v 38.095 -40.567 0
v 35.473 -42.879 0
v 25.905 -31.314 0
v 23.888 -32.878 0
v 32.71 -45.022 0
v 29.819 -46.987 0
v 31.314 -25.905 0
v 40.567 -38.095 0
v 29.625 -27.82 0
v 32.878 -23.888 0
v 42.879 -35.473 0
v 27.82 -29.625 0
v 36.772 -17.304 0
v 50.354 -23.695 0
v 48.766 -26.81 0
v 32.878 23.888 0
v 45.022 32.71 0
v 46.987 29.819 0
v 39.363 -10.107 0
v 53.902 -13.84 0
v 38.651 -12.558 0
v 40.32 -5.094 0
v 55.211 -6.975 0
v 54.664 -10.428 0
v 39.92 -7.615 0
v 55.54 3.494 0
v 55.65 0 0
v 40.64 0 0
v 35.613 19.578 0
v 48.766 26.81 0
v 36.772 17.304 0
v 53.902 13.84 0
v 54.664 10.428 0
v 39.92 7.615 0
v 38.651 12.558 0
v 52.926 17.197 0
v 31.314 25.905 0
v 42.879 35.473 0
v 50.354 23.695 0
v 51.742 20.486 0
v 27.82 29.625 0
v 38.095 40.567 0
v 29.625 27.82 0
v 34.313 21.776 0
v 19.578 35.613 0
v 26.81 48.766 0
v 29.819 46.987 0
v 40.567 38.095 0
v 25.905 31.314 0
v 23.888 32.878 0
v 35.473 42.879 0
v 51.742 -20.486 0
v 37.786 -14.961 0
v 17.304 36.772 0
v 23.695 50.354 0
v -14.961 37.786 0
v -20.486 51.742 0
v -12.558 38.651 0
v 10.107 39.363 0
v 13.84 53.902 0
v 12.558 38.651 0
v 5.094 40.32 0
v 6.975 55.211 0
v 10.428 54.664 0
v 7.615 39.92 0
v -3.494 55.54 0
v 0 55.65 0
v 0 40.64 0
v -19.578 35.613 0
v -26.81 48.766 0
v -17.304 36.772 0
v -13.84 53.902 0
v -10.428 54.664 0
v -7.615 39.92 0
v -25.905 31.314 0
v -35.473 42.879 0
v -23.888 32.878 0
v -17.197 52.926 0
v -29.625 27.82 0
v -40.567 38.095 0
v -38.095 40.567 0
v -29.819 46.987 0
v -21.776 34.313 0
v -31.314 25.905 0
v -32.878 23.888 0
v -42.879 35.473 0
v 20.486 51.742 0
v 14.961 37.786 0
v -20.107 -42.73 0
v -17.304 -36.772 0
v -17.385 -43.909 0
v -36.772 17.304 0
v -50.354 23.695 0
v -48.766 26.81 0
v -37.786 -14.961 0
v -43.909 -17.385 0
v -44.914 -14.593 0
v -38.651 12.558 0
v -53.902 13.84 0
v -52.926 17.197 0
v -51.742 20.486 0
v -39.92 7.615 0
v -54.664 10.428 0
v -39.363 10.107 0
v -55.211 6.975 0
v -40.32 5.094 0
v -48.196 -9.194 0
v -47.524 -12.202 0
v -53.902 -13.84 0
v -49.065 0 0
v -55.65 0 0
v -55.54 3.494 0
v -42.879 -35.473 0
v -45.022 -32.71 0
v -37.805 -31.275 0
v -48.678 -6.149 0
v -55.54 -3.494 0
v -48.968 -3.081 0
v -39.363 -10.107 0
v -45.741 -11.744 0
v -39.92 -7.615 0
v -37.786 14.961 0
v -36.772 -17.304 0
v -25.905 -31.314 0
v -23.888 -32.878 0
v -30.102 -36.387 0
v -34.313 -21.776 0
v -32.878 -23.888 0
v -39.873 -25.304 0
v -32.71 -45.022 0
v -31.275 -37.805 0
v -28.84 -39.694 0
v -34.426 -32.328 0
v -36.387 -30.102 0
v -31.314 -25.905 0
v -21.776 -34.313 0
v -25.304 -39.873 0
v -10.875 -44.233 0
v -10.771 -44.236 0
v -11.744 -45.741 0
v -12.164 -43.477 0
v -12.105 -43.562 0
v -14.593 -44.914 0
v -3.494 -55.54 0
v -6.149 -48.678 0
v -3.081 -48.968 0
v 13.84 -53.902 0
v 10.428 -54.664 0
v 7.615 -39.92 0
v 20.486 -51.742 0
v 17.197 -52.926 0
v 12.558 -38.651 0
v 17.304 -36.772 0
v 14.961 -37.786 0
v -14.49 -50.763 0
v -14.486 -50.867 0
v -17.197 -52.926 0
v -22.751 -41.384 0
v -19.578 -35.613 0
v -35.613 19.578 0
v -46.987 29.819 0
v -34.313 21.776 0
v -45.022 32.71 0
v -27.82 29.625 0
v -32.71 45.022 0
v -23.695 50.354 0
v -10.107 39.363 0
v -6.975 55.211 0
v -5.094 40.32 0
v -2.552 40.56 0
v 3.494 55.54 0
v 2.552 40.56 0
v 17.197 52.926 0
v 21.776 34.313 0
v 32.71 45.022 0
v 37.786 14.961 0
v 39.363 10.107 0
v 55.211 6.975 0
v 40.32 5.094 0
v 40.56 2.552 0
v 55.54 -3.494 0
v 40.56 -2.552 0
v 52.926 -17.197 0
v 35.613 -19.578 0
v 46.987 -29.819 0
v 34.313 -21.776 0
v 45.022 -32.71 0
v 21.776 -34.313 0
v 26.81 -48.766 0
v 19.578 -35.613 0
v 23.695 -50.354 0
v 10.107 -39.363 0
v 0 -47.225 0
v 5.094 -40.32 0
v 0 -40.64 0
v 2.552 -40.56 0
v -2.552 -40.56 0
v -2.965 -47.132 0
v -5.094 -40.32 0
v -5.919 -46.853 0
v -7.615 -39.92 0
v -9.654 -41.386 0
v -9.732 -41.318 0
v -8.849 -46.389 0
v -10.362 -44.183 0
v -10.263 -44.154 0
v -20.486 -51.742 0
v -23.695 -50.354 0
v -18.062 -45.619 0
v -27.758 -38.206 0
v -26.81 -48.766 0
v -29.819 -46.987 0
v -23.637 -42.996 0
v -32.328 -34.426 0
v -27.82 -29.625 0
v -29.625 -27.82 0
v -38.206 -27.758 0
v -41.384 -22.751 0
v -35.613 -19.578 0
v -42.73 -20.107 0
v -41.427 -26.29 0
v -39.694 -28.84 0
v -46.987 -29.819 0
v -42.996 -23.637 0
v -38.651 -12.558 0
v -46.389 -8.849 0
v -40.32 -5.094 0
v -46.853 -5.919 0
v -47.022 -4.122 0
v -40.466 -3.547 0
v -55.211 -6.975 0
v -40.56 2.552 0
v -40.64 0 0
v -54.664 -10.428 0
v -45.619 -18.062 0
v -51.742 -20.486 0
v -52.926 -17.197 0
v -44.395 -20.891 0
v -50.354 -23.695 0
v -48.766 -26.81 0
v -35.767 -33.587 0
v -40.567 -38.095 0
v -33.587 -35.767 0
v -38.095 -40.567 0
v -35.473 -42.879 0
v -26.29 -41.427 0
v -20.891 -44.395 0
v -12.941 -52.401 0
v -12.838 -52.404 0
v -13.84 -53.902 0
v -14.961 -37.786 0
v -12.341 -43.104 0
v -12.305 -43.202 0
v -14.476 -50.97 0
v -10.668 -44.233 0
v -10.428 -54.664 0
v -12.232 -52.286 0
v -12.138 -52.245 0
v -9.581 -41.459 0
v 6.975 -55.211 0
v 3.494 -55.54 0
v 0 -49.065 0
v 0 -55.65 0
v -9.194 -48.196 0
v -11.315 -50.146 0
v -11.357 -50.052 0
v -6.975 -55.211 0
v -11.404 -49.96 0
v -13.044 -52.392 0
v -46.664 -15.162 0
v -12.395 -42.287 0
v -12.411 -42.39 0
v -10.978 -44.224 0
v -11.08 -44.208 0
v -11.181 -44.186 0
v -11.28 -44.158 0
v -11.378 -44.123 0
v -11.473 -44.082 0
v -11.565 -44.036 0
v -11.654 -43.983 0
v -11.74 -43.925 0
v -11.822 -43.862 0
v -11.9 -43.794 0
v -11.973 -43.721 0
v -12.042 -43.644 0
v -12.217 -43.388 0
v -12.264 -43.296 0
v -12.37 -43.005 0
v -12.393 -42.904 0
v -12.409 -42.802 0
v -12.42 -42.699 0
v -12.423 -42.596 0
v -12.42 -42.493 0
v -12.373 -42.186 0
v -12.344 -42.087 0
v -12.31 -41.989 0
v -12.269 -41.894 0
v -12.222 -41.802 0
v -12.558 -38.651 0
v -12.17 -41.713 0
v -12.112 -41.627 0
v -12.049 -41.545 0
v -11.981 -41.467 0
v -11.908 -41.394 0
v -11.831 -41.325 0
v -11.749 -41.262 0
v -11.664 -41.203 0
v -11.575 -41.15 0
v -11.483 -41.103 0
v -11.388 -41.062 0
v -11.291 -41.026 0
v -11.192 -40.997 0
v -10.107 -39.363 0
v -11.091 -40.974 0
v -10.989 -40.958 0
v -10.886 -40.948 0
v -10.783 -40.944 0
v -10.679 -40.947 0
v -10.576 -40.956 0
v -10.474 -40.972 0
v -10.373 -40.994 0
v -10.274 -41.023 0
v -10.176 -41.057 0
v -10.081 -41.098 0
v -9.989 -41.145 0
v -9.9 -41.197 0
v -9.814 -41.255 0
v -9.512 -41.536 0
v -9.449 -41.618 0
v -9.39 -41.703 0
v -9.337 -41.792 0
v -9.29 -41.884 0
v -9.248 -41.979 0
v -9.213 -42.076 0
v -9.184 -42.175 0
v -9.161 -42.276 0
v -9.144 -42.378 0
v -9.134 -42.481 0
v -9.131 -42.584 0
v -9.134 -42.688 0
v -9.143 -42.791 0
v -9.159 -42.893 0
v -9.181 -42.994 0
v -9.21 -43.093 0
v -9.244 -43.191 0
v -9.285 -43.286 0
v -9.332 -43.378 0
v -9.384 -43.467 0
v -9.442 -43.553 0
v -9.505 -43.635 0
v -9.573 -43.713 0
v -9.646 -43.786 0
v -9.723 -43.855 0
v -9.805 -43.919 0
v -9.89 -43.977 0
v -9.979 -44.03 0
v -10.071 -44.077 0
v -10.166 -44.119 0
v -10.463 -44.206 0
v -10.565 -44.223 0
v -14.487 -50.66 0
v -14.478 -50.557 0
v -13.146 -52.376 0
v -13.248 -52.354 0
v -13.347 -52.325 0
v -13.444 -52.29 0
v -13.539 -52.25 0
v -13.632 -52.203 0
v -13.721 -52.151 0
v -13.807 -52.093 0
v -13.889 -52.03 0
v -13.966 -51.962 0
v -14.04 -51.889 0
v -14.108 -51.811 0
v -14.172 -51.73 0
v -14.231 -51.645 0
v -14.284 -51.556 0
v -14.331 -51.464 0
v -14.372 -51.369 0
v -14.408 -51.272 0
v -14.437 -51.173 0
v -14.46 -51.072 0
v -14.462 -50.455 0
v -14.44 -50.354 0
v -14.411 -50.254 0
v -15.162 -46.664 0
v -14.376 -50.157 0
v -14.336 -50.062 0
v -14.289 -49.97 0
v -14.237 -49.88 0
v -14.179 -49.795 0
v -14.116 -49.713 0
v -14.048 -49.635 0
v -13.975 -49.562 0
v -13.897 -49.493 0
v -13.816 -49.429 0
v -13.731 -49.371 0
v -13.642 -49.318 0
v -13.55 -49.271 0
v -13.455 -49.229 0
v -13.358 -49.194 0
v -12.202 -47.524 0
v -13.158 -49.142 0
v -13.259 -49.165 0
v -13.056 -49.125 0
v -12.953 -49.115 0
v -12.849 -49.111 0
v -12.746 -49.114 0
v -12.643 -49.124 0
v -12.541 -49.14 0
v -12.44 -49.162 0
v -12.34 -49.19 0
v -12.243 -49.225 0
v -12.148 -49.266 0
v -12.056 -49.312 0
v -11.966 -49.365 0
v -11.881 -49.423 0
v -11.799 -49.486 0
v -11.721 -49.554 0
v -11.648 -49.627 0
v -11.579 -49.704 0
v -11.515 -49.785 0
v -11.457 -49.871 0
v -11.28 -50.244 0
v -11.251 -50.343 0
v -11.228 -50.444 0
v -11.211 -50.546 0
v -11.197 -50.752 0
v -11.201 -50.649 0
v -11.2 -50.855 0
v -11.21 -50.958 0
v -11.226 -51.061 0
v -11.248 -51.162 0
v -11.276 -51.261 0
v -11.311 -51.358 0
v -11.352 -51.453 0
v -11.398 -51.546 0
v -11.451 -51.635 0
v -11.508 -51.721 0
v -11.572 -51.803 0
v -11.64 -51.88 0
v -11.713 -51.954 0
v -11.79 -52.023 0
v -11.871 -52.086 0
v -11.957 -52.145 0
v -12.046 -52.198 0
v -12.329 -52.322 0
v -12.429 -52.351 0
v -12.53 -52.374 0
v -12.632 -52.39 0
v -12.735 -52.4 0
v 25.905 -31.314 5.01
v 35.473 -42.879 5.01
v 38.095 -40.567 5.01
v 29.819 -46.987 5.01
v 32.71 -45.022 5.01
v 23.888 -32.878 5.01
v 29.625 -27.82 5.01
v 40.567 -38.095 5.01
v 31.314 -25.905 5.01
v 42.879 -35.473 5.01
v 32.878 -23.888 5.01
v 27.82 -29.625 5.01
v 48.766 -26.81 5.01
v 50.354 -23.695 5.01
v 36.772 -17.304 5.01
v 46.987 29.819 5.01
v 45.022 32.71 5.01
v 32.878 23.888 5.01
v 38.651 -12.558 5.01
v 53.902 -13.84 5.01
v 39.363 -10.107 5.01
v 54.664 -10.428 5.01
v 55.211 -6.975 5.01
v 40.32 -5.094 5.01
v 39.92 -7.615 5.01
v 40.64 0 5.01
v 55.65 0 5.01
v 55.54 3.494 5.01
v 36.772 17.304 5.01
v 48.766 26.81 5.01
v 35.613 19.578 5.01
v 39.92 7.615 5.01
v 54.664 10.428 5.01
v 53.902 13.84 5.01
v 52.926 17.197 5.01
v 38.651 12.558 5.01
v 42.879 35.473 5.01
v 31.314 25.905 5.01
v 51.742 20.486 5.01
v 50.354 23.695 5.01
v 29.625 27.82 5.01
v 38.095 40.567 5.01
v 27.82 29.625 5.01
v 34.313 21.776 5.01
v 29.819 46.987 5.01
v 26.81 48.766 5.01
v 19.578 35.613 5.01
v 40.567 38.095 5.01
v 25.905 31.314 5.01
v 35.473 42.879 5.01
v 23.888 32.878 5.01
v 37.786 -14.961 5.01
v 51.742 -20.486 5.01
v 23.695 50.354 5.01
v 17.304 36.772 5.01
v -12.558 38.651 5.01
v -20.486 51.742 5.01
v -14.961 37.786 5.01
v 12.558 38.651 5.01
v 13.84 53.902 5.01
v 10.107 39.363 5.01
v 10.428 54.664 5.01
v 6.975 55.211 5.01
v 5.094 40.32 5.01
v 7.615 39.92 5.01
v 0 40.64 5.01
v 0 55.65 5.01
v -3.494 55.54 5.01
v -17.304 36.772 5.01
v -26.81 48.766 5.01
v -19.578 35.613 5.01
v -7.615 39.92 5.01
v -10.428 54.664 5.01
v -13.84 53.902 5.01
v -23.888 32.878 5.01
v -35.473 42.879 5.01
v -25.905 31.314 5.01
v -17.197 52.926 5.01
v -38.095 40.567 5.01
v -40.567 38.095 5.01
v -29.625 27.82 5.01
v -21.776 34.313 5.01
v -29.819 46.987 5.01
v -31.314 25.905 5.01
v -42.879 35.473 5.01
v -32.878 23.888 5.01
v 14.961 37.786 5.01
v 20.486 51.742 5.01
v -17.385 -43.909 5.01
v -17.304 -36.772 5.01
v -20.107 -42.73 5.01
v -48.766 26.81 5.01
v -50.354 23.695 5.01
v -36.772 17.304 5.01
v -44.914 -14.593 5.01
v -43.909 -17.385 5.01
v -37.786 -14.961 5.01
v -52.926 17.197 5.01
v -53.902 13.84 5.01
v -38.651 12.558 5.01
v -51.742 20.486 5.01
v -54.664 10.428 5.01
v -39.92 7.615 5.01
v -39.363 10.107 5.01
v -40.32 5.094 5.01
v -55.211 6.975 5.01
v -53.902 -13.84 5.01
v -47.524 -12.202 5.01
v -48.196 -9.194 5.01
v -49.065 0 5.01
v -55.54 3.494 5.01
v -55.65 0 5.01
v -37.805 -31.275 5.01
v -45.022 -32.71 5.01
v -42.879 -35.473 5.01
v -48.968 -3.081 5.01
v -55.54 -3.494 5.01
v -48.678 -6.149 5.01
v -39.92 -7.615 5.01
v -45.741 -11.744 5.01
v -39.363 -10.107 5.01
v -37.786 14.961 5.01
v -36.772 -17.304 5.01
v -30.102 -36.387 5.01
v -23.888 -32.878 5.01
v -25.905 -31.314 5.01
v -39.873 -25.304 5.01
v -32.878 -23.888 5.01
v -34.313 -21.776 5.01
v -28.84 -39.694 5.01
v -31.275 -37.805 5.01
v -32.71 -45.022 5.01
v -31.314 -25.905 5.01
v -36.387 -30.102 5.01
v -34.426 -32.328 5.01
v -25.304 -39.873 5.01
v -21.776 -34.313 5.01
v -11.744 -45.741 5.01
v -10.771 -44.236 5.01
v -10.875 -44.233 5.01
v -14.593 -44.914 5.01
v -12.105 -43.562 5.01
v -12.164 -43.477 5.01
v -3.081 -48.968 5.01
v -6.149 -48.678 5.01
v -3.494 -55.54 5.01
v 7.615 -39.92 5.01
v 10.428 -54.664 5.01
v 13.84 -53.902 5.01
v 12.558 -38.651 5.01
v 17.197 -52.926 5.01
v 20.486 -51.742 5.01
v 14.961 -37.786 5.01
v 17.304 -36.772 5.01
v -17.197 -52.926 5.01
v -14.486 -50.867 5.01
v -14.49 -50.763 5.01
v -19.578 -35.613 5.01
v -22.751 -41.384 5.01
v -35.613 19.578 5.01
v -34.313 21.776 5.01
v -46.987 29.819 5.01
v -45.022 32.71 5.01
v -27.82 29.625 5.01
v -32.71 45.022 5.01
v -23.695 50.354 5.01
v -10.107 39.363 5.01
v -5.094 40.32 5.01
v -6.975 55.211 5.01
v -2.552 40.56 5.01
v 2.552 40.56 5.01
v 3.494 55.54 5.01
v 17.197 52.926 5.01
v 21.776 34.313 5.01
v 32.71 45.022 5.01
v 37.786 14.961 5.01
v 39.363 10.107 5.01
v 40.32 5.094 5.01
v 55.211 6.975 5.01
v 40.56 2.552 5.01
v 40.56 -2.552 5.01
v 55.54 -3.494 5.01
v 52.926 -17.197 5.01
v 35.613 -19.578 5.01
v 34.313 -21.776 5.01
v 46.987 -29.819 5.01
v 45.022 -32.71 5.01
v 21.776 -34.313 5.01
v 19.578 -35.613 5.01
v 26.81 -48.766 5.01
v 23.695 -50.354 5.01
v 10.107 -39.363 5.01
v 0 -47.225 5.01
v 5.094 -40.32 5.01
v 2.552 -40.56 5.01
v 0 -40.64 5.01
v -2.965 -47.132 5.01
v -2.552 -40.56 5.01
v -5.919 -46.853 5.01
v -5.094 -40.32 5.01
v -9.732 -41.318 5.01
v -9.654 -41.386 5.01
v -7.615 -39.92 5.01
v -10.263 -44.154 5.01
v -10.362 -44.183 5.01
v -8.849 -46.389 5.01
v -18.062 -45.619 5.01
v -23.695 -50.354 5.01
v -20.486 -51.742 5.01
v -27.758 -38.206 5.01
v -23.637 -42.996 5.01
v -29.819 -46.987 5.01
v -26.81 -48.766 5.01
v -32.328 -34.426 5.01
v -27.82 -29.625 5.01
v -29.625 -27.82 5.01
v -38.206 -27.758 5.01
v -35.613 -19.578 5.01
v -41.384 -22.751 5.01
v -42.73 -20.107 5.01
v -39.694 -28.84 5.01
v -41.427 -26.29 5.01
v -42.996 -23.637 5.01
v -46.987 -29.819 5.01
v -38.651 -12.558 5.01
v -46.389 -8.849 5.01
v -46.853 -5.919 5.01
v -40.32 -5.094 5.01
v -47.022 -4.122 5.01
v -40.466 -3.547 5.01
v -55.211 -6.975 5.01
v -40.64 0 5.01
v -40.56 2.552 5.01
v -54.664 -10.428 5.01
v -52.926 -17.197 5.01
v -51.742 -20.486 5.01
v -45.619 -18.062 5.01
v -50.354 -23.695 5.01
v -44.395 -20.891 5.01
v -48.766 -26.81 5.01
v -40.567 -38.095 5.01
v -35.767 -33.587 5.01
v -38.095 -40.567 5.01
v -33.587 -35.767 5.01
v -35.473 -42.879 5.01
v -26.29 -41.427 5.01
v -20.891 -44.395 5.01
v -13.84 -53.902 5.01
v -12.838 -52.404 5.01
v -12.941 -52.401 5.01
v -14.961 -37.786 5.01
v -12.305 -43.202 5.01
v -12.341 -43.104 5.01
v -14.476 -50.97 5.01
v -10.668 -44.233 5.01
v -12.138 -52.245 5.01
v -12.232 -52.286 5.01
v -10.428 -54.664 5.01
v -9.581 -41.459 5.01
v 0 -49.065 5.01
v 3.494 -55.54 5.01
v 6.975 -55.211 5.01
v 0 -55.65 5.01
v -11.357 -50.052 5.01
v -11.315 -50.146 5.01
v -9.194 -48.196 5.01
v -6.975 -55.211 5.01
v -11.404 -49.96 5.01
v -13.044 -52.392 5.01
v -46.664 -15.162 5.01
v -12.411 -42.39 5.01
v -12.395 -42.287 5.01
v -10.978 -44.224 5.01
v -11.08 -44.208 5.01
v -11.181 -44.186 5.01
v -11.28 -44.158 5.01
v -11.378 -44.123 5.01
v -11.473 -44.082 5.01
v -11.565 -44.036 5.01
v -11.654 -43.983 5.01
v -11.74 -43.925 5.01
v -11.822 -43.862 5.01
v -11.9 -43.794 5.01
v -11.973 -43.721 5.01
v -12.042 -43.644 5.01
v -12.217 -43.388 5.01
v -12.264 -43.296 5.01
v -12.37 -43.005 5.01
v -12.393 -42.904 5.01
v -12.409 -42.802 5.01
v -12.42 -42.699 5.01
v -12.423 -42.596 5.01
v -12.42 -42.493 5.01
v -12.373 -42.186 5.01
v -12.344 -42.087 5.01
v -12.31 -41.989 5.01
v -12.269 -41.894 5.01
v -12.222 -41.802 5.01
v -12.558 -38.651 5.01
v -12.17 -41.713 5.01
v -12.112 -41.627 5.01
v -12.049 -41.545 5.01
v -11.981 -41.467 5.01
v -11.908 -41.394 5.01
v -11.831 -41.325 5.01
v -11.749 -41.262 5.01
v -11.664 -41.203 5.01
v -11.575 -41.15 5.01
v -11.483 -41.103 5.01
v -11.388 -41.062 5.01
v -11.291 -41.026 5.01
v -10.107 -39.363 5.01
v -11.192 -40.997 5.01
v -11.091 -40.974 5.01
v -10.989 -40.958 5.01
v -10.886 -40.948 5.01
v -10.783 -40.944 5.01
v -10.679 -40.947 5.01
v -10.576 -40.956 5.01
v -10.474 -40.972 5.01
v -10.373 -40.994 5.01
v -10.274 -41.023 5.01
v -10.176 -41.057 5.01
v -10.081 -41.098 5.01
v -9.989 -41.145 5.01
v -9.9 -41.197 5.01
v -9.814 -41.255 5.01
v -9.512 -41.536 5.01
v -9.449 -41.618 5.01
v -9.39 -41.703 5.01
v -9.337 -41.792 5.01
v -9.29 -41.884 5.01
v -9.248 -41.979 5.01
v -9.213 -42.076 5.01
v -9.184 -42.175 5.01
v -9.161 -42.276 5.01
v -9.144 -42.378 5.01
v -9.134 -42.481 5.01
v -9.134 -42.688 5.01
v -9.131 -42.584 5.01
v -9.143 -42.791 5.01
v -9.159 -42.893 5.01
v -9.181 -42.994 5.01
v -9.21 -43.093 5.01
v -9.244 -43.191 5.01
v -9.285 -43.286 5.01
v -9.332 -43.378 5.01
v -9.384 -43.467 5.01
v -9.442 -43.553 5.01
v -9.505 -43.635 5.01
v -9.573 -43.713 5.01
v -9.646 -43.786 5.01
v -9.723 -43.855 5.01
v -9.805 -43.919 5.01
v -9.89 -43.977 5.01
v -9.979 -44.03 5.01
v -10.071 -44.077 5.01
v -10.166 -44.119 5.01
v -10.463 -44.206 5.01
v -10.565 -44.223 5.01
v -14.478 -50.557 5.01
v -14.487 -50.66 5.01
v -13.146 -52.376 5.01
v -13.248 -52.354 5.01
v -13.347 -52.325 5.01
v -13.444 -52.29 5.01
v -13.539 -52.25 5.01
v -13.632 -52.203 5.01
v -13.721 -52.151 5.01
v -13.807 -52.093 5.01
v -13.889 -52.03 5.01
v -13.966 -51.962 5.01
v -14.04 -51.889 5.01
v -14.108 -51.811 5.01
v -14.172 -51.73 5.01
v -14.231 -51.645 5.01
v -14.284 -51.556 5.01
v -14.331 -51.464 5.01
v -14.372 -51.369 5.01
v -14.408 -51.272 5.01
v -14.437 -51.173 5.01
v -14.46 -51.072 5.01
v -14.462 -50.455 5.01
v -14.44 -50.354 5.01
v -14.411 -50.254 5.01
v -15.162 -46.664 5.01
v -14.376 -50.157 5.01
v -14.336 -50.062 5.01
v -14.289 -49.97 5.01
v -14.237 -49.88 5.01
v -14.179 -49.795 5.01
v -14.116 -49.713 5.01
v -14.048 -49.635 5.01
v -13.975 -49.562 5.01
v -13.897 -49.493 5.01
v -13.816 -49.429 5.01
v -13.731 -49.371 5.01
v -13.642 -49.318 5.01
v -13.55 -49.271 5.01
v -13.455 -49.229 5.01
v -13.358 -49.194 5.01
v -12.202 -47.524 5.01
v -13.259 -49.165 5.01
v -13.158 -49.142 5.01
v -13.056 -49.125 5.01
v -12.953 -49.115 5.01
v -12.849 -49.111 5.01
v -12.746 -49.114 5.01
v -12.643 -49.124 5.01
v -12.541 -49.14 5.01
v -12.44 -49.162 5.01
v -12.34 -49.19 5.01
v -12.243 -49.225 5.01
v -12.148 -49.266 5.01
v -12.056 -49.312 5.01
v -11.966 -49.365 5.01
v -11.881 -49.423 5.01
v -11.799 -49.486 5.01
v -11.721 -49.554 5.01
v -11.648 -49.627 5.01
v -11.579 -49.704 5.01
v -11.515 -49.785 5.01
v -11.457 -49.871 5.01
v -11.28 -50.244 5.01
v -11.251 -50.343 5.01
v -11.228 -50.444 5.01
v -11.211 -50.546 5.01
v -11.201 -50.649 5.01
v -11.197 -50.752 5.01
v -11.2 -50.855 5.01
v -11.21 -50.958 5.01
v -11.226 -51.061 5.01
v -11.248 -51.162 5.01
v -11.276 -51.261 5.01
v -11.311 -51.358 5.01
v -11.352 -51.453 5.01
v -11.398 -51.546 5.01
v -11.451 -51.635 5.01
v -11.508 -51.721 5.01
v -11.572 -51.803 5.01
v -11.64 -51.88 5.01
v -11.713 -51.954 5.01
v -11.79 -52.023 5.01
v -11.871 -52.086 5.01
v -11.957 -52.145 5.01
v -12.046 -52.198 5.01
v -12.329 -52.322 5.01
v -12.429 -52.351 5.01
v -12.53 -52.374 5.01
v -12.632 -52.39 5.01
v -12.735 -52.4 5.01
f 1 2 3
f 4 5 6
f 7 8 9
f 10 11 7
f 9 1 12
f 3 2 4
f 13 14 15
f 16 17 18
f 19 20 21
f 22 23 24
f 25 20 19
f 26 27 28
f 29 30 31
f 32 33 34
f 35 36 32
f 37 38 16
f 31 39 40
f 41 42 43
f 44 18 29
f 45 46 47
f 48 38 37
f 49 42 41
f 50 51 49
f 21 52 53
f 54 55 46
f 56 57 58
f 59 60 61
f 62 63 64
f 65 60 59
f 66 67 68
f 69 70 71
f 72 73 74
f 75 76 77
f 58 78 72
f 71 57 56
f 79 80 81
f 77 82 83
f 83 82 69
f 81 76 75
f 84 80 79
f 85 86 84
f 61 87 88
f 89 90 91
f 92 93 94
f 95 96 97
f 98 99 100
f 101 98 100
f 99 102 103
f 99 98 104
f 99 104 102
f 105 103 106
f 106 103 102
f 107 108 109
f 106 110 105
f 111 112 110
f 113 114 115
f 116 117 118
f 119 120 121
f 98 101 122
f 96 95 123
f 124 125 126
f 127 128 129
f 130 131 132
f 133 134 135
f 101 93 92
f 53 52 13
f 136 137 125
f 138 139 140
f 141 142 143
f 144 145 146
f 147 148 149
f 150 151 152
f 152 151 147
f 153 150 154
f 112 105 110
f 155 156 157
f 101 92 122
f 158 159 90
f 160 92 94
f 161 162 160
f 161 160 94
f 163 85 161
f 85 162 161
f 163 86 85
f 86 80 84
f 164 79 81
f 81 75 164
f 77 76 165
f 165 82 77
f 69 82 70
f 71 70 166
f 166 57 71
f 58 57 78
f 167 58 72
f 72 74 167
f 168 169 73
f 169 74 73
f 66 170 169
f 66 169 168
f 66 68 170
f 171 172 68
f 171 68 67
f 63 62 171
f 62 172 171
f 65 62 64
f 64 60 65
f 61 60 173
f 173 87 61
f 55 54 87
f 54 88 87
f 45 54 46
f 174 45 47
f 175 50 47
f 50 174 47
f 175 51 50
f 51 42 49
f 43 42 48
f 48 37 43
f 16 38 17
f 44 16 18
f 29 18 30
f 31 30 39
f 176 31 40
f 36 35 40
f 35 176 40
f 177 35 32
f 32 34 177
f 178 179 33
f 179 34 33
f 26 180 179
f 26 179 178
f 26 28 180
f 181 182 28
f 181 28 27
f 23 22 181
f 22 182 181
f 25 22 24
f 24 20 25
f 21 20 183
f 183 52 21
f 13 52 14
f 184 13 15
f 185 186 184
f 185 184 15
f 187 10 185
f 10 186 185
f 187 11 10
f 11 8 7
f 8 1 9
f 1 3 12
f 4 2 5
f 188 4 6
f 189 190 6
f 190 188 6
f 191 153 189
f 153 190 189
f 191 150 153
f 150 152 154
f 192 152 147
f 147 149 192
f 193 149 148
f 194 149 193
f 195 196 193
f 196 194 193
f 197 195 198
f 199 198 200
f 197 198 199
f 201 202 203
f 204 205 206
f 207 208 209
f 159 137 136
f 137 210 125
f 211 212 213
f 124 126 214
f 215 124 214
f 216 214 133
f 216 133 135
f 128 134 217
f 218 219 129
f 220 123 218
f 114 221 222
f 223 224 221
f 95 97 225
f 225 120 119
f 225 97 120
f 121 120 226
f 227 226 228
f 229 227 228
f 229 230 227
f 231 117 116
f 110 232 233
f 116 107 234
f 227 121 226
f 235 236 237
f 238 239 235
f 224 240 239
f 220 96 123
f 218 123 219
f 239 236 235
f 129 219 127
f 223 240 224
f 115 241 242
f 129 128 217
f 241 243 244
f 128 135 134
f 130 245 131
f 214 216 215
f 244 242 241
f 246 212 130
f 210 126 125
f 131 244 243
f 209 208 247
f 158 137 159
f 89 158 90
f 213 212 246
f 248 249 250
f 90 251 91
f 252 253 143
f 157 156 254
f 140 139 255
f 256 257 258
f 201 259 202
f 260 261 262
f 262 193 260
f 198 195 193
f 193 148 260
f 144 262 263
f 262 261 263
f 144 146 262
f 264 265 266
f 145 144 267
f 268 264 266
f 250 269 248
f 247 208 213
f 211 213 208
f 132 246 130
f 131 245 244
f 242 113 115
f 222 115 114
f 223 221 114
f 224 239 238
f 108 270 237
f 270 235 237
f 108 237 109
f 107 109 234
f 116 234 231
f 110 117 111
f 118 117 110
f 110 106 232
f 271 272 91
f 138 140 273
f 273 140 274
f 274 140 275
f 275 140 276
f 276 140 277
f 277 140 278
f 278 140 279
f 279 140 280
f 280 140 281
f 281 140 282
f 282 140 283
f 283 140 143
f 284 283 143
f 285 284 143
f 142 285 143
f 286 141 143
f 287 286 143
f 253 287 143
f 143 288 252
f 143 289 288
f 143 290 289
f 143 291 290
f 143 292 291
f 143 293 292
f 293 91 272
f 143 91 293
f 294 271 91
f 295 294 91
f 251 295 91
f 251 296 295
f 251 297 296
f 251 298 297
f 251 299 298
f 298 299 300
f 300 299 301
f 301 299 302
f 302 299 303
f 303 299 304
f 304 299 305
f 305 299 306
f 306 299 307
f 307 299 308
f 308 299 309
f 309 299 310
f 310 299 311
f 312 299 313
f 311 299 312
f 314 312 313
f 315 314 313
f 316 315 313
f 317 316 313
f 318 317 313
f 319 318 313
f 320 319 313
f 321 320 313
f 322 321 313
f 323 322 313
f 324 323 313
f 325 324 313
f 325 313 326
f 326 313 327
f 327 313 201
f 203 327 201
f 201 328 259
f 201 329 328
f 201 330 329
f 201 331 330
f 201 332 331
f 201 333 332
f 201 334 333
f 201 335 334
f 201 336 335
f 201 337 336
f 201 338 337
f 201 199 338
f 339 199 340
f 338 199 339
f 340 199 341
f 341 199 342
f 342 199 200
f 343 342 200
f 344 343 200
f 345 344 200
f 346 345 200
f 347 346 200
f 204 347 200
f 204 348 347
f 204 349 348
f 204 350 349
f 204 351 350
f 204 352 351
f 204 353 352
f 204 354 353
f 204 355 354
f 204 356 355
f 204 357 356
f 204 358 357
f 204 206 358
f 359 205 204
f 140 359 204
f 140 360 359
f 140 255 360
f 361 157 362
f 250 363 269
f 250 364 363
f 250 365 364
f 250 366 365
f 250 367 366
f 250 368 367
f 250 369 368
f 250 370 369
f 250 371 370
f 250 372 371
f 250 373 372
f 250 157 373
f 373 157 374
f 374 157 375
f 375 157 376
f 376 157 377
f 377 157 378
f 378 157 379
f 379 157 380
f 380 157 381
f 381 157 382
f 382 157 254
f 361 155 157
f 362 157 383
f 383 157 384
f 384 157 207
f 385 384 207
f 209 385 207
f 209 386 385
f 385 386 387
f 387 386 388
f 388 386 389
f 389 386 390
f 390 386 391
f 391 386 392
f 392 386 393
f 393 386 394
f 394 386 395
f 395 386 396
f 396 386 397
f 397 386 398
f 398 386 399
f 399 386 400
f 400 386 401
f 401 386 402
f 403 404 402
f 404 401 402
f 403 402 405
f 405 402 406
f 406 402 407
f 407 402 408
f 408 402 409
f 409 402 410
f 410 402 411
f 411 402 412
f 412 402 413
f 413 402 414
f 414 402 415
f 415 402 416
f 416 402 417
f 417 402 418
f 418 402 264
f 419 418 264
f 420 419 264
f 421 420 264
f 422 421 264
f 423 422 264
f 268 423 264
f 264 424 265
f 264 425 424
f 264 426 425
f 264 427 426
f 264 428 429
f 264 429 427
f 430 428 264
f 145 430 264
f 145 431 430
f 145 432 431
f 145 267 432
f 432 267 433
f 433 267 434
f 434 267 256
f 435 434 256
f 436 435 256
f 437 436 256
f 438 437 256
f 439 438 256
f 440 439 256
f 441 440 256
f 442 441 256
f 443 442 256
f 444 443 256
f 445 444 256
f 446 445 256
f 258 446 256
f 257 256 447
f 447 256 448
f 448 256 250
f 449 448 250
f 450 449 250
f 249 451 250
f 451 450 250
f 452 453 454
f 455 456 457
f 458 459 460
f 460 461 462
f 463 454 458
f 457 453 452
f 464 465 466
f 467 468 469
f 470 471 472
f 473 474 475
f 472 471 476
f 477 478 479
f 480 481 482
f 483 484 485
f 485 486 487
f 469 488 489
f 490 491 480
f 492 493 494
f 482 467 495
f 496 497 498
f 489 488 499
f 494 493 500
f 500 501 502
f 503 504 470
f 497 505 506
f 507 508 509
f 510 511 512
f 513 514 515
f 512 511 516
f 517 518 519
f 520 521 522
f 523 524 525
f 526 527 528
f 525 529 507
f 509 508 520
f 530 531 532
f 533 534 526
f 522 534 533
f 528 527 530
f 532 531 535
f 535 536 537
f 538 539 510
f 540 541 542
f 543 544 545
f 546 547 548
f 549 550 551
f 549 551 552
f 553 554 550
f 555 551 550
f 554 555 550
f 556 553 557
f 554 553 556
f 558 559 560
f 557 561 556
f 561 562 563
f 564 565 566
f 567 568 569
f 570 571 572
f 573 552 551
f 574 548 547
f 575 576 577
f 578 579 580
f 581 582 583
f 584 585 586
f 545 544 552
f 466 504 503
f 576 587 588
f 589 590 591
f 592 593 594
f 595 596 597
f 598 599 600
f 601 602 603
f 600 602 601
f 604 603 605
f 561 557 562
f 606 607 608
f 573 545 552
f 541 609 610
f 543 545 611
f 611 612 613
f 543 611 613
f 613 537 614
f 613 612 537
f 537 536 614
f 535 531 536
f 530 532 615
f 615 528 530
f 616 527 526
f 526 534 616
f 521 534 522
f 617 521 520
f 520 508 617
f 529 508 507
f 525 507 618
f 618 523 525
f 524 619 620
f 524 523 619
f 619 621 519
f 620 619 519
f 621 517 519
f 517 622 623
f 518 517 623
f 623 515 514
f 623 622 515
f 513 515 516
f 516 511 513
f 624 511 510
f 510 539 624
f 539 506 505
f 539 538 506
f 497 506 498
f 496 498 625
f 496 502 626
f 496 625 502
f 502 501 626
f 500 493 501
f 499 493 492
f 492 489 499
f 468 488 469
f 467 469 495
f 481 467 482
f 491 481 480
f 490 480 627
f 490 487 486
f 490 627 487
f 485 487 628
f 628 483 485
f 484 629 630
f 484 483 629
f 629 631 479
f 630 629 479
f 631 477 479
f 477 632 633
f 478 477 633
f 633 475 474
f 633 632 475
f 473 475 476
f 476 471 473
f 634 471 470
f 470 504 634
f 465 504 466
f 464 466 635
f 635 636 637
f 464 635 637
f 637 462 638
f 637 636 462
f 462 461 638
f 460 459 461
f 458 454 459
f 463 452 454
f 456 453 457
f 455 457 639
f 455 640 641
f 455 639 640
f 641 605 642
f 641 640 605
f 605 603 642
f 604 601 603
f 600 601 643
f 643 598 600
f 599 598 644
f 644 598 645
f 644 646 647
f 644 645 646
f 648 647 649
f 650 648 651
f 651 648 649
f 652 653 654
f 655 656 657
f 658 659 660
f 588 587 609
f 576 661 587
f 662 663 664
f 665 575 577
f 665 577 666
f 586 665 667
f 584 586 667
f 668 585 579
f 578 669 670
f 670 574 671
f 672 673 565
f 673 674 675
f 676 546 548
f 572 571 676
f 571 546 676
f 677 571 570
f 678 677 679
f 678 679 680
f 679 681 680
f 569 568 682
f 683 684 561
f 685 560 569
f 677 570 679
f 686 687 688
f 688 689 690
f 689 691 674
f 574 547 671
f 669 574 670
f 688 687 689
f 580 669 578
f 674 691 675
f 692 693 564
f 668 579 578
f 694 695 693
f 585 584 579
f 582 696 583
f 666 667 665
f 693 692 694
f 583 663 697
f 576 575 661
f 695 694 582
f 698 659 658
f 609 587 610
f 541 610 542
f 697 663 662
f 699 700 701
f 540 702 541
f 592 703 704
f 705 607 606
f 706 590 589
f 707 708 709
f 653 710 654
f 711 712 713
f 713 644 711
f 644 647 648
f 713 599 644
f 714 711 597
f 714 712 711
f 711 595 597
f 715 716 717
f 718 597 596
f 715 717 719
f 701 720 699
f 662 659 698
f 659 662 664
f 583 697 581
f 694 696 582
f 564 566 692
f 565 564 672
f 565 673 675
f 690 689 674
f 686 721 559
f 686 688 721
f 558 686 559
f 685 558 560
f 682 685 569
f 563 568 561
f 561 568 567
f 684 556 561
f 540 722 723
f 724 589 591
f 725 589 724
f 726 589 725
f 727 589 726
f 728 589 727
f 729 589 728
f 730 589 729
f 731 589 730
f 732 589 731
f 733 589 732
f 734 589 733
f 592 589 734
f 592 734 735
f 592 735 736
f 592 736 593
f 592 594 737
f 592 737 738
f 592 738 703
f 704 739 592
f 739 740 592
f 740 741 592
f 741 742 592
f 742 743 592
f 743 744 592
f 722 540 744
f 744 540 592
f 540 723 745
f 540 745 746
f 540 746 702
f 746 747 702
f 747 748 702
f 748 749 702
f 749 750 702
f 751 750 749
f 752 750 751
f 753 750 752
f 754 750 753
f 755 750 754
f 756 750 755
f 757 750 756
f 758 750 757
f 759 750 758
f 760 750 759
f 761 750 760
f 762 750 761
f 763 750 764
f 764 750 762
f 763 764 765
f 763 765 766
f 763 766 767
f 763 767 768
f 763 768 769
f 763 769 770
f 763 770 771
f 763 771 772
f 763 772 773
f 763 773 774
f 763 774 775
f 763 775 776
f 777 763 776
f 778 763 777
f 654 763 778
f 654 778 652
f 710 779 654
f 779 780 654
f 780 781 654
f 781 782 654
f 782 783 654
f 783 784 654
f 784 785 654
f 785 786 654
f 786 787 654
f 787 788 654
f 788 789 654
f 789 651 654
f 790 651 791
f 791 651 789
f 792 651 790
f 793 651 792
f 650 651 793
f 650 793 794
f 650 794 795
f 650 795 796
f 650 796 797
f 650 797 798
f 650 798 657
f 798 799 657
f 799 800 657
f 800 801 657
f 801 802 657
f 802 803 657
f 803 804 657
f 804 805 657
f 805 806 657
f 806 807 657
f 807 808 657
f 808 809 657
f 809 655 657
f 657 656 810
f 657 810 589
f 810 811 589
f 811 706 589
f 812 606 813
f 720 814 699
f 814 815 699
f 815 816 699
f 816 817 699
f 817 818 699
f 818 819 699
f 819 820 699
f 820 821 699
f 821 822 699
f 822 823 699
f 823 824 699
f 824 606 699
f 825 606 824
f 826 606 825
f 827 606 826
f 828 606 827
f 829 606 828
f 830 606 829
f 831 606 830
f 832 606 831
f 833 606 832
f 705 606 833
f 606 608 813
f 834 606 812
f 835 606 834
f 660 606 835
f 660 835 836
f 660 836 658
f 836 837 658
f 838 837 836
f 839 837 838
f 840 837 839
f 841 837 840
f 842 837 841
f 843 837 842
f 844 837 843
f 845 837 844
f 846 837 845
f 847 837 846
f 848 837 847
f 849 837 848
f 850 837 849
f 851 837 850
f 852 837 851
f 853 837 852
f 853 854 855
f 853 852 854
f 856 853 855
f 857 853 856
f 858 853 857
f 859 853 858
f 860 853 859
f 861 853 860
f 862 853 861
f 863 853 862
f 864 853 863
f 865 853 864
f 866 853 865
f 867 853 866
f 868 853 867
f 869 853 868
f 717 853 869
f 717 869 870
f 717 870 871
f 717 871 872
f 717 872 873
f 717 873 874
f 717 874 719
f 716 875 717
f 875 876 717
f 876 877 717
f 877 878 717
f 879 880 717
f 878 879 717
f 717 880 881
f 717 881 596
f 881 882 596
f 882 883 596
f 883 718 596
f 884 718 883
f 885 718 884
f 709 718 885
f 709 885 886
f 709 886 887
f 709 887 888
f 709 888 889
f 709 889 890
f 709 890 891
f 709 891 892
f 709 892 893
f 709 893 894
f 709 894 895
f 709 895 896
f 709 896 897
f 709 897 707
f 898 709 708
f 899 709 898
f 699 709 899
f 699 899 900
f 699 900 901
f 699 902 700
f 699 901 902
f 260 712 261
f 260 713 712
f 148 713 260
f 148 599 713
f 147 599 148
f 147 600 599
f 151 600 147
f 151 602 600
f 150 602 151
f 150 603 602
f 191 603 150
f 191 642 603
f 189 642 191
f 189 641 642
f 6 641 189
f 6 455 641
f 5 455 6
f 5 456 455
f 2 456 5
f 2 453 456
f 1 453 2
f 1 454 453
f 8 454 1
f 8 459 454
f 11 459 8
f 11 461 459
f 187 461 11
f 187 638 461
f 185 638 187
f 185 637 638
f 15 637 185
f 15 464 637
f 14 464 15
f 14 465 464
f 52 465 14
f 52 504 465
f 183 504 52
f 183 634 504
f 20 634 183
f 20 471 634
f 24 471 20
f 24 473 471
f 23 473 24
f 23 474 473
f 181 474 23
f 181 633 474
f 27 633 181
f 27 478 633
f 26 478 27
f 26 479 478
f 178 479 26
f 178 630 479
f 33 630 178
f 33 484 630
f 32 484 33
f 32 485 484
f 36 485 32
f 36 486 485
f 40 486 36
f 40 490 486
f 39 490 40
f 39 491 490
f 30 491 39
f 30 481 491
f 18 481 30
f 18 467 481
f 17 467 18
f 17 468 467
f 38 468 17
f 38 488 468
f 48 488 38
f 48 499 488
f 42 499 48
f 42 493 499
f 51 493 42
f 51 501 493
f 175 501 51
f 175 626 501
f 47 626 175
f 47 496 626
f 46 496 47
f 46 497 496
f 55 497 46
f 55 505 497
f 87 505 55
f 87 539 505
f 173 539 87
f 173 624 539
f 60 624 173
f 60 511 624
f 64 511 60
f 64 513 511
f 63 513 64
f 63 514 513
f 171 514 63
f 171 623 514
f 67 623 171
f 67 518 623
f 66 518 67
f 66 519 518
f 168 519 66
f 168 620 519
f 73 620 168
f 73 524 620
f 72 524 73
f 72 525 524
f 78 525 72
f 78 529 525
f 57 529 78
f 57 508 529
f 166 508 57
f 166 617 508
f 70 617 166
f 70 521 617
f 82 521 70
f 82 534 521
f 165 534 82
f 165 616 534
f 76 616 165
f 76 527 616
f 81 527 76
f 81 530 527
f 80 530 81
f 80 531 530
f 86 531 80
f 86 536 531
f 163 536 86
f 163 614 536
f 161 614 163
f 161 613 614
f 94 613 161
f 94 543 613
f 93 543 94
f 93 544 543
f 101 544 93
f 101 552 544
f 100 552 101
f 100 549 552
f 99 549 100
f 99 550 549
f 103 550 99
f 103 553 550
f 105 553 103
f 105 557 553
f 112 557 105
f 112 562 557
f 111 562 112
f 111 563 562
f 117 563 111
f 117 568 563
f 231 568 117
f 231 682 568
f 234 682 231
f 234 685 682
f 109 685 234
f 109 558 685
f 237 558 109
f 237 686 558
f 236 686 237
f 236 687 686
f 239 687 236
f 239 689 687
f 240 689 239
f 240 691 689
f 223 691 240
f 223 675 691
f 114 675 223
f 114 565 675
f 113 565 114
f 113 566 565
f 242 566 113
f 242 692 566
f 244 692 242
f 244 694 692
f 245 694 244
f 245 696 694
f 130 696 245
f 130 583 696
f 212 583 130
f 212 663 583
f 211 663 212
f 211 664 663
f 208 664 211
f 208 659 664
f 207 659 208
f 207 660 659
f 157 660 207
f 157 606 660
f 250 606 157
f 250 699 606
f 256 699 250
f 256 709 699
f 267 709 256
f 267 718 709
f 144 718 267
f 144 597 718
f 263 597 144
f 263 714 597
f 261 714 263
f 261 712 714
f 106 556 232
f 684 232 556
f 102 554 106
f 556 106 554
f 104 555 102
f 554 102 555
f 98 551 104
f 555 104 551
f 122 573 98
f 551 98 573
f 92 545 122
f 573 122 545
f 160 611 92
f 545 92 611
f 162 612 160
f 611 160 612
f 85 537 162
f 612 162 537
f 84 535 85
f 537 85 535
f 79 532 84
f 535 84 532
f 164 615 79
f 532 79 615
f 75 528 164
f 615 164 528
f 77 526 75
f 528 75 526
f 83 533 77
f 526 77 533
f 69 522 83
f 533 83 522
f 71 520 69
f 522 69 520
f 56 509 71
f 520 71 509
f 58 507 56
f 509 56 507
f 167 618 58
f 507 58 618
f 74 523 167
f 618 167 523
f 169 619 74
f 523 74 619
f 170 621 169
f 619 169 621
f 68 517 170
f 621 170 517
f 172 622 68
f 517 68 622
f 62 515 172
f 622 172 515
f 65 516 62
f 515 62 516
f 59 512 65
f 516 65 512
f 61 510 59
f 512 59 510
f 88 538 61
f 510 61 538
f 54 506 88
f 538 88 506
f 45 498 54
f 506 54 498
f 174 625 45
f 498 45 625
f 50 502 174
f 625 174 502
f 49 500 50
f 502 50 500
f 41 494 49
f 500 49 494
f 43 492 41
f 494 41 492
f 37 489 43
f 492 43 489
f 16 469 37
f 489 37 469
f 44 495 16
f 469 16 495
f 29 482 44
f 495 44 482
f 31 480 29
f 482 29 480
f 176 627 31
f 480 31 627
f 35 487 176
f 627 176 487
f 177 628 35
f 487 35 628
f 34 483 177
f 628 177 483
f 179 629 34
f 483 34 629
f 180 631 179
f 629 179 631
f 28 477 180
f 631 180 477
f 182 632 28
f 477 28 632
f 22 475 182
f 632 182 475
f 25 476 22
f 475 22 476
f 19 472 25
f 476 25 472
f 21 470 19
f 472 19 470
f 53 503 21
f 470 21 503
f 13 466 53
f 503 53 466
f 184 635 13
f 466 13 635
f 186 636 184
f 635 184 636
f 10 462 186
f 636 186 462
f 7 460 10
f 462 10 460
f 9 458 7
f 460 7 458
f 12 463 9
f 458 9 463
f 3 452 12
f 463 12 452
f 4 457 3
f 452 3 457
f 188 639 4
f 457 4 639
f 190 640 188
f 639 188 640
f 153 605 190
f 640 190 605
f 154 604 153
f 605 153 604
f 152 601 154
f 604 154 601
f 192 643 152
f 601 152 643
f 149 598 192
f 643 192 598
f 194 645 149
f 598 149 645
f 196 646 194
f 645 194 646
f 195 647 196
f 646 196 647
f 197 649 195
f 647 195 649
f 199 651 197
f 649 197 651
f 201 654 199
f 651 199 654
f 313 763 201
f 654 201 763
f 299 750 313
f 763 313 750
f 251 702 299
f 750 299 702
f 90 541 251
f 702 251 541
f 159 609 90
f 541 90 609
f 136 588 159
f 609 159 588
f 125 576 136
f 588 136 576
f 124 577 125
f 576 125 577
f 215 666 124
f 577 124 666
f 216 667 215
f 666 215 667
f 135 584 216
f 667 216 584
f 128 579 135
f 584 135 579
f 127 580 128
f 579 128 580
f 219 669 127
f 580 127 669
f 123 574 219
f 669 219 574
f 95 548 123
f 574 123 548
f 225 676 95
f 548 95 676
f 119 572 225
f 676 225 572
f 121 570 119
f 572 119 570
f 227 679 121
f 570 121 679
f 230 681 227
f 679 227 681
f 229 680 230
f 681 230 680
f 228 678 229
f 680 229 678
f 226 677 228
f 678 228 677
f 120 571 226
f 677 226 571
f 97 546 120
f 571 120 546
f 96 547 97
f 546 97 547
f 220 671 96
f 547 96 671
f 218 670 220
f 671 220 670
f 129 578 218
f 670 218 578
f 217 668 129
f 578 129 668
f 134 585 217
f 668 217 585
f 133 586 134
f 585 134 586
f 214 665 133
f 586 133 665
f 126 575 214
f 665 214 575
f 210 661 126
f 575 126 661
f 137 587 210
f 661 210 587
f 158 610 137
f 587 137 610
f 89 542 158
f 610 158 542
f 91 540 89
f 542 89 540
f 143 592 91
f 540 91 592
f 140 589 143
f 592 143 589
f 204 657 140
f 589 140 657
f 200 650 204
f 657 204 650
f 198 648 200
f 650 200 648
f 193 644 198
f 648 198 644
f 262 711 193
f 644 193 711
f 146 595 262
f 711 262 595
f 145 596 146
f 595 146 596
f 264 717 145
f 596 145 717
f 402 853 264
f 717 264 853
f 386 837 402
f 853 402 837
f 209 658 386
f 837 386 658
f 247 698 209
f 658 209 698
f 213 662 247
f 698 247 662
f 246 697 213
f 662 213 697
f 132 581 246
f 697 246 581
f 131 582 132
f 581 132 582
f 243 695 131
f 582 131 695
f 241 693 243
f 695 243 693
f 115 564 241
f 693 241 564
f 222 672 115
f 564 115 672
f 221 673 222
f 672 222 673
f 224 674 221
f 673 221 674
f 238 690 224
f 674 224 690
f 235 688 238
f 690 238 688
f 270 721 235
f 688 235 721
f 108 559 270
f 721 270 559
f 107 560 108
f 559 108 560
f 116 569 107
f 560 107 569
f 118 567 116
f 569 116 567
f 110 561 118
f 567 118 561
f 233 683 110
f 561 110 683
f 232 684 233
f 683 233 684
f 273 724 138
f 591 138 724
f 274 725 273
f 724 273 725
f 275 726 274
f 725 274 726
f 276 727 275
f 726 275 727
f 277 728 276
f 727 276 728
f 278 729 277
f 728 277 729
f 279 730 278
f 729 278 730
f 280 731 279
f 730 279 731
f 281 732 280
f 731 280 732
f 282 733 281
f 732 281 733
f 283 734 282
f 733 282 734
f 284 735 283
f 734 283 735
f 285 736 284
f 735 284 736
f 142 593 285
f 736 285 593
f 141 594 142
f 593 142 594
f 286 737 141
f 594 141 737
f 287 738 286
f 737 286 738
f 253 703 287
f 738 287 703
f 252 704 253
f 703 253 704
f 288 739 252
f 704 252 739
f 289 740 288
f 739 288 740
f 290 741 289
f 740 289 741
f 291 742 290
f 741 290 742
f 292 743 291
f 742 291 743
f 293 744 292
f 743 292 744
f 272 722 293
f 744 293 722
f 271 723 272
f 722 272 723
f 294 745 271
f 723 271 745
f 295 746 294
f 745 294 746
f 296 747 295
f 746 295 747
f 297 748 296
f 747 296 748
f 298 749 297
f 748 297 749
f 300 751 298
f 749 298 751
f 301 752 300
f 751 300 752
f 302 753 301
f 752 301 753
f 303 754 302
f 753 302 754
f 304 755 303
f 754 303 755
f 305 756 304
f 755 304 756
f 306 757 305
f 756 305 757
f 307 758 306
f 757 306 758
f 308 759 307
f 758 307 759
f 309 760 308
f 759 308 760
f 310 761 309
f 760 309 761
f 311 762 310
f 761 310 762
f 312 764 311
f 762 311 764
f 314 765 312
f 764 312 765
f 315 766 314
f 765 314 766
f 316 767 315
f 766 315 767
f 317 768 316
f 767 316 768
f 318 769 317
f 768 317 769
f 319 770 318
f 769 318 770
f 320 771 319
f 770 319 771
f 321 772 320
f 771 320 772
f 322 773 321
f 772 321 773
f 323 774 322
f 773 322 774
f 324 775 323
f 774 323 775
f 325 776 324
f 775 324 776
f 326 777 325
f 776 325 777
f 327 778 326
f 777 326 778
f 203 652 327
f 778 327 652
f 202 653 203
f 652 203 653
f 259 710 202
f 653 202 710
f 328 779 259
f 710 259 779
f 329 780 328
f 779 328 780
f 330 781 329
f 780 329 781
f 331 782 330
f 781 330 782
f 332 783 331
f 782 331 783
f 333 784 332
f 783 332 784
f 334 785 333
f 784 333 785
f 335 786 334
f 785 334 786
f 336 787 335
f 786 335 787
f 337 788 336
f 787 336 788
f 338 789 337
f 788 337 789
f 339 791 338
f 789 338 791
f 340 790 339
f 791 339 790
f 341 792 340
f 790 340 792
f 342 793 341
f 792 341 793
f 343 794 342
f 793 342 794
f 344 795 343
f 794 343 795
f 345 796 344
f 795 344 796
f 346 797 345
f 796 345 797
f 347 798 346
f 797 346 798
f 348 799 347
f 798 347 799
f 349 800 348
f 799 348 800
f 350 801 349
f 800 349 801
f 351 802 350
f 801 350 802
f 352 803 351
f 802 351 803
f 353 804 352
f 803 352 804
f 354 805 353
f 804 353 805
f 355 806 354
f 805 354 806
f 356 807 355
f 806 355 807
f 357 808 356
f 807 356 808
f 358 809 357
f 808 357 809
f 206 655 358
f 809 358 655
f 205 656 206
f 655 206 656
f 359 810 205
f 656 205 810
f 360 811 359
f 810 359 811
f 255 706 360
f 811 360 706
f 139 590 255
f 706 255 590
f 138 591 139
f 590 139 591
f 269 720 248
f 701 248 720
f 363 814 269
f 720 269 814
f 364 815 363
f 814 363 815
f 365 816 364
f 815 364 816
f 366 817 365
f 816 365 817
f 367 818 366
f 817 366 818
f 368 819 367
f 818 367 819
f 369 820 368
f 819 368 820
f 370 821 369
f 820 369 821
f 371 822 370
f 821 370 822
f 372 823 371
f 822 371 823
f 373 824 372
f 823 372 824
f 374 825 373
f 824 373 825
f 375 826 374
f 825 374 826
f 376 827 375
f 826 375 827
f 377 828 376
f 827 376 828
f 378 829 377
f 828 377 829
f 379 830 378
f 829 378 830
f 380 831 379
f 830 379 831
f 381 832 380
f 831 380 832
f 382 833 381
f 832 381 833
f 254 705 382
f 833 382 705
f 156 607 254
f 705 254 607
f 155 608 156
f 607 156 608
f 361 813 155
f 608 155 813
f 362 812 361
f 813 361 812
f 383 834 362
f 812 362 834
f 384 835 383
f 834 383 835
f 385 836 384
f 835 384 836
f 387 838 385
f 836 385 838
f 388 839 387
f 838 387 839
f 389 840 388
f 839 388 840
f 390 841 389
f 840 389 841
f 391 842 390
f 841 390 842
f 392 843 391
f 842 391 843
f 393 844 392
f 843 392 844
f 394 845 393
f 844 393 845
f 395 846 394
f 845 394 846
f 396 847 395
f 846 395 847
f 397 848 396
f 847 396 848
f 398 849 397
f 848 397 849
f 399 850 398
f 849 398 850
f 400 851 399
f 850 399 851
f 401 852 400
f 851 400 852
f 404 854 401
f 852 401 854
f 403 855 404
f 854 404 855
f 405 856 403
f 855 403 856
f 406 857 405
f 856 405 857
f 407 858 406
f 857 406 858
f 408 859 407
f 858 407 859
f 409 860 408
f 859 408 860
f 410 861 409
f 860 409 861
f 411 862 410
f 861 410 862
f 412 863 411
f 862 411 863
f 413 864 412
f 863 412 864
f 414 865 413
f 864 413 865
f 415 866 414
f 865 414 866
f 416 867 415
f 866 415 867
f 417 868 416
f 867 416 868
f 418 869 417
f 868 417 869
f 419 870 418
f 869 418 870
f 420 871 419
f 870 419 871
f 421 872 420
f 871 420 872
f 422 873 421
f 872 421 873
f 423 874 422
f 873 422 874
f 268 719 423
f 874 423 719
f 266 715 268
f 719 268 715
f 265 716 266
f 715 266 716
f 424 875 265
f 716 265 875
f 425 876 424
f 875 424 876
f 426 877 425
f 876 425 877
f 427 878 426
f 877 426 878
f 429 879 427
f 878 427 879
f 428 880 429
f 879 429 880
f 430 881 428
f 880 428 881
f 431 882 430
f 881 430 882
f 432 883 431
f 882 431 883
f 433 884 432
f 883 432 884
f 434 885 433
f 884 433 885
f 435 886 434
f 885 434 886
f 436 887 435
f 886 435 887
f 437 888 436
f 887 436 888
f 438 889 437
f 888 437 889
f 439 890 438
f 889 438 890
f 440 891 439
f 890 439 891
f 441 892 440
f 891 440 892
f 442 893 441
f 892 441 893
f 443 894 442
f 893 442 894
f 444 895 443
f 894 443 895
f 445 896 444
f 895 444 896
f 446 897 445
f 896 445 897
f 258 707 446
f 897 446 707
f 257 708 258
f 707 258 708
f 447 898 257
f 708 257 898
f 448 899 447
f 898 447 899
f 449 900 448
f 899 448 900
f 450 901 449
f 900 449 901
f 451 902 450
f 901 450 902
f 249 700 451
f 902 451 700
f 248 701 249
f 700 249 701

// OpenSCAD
// Outer diameter 
D = 111.3; 
// Ring thickness
d = 15.01;  
// Notch width
s = 1.84;  
// Angle for the feedpoint section
alpha = 14.2; 
// Substrate height
substrate_height = 5.01; 
// how large is the angle of the inner ring cut
inner_ring_cut_angle = 5.01; 

// Sector module to create a filled sector between two angles
module sector(radius, angles, fn = 100) {
    r = radius / cos(180 / fn);
    step = -360 / fn;

    points = concat([[0, 0]],
        [for(a = [angles[0] : step : angles[1] - 360]) 
            [r * cos(a), r * sin(a)]
        ],
        [[r * cos(angles[1]), r * sin(angles[1])]]
    );

    difference() {
        circle(radius, $fn = fn);
        polygon(points);
    }
}

// Arc module to create an arc with a specified thickness between two angles
module arc(radius, angles, width = 1, fn = 100) {
    difference() {
        sector(radius + width / 2, angles, fn);
        sector(radius - width / 2, angles, fn);
    }
}

// Small sector subtraction module
module small_sector(radius, angles, fn = 100) {
    sector(radius, angles, fn);
}

module ring_segment(D, d, s, alpha) {
    outer_radius = D / 2;
    inner_radius = outer_radius - d;
    marker_radius = (d-s)/8; // Diameter of markers is s/4, so radius is s/8

    // Main ring
    difference() {
        circle(outer_radius, $fn=100);
        circle(inner_radius, $fn=100);

        // Subtract the semi-circular notch (quarter ring) from 180 to 270 degrees
        arc((inner_radius + outer_radius) / 2, [180, 270], s, fn=100);

        // Subtract the smaller sector at 180 degrees to intersect with the notch
        small_sector((inner_radius + outer_radius) / 2, [180, 180+inner_ring_cut_angle], fn=100);

        // Subtract feedpoint markers
        rotate([0, 0, -90]) {
            angle = alpha;
            rotate([0, 0, -angle]) {
                translate([outer_radius-marker_radius*2, 0])
                circle(marker_radius, $fn=100);
                translate([inner_radius+marker_radius*2, 0])
                circle(marker_radius, $fn=100);
            }
        }
    }
}

// Extrude the 2D shape to the specified substrate height
linear_extrude(height = substrate_height)
    ring_segment(D, d, s, alpha);
